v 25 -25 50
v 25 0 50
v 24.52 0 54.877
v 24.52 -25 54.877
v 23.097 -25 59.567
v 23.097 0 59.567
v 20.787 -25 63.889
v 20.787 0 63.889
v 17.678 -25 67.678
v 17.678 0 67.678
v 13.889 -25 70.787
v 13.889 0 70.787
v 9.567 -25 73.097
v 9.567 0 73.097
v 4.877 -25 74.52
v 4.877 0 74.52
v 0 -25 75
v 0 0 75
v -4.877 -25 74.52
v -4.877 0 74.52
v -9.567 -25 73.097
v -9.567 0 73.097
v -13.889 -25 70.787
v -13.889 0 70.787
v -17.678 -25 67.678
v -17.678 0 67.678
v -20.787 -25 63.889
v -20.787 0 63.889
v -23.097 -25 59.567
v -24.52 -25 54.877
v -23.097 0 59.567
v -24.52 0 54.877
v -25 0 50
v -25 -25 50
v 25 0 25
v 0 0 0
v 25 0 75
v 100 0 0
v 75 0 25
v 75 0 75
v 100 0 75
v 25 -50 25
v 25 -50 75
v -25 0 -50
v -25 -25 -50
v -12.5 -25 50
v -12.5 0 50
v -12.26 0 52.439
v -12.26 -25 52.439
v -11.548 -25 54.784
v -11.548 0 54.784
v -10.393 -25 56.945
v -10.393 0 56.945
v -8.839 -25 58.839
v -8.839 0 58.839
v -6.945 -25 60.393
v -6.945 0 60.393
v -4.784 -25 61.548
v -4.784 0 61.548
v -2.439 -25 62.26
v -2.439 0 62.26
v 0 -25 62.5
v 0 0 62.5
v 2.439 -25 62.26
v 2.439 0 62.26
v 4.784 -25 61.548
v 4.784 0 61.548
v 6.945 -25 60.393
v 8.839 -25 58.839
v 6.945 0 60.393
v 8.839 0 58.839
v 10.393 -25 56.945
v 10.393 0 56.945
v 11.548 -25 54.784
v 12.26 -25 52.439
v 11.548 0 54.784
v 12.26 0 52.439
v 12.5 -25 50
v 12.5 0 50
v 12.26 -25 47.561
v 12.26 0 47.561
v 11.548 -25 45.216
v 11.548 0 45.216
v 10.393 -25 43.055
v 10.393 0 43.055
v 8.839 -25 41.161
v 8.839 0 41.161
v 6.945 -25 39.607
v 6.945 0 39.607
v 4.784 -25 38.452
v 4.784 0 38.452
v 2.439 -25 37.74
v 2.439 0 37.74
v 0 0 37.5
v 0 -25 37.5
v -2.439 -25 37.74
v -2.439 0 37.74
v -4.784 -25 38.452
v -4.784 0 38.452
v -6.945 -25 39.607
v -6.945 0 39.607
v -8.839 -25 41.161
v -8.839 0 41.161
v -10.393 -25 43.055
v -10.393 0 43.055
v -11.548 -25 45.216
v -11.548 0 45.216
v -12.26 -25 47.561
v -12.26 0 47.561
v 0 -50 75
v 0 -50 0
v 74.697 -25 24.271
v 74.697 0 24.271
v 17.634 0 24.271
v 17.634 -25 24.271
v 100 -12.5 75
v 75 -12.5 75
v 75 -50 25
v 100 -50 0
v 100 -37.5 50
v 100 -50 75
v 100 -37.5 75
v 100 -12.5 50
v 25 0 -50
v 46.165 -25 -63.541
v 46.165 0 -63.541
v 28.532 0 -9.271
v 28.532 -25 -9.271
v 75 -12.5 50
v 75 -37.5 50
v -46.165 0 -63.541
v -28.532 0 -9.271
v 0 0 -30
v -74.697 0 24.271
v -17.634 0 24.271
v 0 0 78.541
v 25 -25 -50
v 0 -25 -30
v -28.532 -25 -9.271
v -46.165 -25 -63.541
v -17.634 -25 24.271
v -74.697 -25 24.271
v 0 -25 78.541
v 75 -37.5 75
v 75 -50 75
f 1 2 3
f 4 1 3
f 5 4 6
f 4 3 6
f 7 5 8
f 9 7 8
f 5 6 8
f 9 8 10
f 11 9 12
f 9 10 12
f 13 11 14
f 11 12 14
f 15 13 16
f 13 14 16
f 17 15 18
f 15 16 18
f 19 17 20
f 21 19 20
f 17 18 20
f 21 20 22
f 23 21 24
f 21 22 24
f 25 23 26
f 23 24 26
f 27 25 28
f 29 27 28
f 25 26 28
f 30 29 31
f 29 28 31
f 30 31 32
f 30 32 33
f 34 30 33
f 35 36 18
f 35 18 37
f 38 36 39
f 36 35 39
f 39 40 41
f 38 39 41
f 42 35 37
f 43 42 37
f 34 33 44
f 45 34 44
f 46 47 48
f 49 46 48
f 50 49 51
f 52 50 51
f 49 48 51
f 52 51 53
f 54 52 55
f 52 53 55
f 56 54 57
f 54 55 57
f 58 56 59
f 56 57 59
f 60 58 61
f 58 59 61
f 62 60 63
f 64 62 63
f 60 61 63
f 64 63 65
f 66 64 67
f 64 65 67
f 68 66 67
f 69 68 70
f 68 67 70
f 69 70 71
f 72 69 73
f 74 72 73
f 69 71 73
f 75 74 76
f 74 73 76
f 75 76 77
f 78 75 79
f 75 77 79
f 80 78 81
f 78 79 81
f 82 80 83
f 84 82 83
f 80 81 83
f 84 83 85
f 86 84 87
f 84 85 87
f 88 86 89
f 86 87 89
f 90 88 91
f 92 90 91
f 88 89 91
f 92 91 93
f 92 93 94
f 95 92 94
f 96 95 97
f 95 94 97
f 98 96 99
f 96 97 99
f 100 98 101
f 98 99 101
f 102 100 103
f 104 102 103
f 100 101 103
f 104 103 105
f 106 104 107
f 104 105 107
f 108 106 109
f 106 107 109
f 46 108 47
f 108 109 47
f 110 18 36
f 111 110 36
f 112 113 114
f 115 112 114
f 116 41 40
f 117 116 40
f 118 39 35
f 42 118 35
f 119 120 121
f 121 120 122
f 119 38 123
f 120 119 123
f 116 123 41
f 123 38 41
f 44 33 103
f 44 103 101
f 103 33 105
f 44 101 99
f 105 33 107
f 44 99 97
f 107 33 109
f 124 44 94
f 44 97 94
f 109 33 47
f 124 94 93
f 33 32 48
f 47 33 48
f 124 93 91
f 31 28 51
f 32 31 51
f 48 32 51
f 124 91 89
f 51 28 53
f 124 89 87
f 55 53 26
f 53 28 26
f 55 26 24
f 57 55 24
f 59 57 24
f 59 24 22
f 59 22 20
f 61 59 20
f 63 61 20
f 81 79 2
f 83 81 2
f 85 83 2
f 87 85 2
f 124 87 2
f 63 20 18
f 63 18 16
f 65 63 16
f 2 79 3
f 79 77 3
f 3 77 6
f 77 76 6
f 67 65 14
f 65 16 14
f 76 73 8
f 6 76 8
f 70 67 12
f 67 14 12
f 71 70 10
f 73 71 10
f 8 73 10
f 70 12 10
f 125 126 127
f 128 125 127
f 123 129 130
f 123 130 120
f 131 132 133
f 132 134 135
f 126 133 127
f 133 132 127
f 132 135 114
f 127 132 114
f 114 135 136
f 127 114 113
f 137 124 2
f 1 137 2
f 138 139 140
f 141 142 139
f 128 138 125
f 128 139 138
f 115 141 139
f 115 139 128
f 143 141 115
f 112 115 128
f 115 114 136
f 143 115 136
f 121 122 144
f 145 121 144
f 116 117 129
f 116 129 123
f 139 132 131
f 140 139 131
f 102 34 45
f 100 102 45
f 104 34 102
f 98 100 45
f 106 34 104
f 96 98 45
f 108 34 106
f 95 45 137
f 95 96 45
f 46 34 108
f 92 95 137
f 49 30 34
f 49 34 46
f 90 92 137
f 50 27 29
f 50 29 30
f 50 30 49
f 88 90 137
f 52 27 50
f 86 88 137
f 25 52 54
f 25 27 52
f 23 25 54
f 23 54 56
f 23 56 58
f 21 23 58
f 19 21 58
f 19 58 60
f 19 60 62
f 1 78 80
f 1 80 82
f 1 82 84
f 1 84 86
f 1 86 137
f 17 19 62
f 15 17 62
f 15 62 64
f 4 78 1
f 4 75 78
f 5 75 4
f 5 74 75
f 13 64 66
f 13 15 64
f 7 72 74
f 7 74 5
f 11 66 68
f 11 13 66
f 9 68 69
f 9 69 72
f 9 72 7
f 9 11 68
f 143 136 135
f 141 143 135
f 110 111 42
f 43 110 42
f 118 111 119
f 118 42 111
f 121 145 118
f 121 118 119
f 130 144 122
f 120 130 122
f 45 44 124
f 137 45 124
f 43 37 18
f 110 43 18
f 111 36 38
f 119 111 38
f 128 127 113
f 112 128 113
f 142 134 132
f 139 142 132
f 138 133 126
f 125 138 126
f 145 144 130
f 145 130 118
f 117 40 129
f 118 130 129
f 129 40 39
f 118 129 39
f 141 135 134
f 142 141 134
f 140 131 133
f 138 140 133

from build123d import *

# Parameters (mm, degrees)
F1_DEPTH = 25
F3_DEPTH = 25
F5_DEPTH = 50
F6_W     = 25
F6_H     = 25
F7_DEPTH = 25


with BuildPart() as f1:
    # F0 (on Front) → F1 (new body)
    with BuildSketch(Plane.XZ):
        with BuildLine():
            ThreePointArc((-28.531695, -9.27051), (-28.531695, 9.27051), (-17.633558, 24.27051))
            Line((-17.633558, 24.27051), (-74.696949, 24.27051))
            Line((-74.696949, 24.27051), (-28.531695, -9.27051))
        make_face()
        with BuildLine():
            ThreePointArc((17.633558, 24.27051), (0, 30), (-17.633558, 24.27051))
            ThreePointArc((-17.633558, 24.27051), (-28.531695, 9.27051), (-28.531695, -9.27051))
            ThreePointArc((-28.531695, -9.27051), (-17.633558, -24.27051), (0, -30))
            ThreePointArc((0, -30), (17.633558, -24.27051), (28.531695, -9.27051))
            ThreePointArc((28.531695, -9.27051), (29.63065, -4.693034), (30, 0))
            ThreePointArc((30, 0), (26.730196, 13.619715), (17.633558, 24.27051))
        make_face()
        with BuildLine():
            Line((17.633558, 24.27051), (0, 78.54102))
            Line((0, 78.54102), (-17.633558, 24.27051))
            ThreePointArc((-17.633558, 24.27051), (0, 30), (17.633558, 24.27051))
        make_face()
        with BuildLine():
            Line((74.696949, 24.27051), (17.633558, 24.27051))
            ThreePointArc((17.633558, 24.27051), (26.730196, 13.619715), (30, 0))
            ThreePointArc((30, 0), (29.63065, -4.693034), (28.531695, -9.27051))
            Line((28.531695, -9.27051), (74.696949, 24.27051))
        make_face()
        with BuildLine():
            ThreePointArc((28.531695, -9.27051), (17.633558, -24.27051), (0, -30))
            Line((0, -30), (46.165253, -63.54102))
            Line((46.165253, -63.54102), (28.531695, -9.27051))
        make_face()
        with BuildLine():
            ThreePointArc((0, -30), (-17.633558, -24.27051), (-28.531695, -9.27051))
            Line((-28.531695, -9.27051), (-46.165253, -63.54102))
            Line((-46.165253, -63.54102), (0, -30))
        make_face()
    extrude(amount=F1_DEPTH)


with BuildPart() as f3:
    # F2 (on Front) → F3 (new body)
    with BuildSketch(Plane.XZ):
        with BuildLine():
            Line((25, -50), (25, 50))
            ThreePointArc((25, 50), (0, 25), (-25, 50))
            Line((-25, 50), (-25, -50))
            Line((-25, -50), (25, -50))
        make_face()
        with BuildLine():
            ThreePointArc((-12.5, 50), (0, 62.5), (12.5, 50))
            Line((12.5, 50), (25, 50))
            ThreePointArc((25, 50), (0, 75), (-25, 50))
            Line((-25, 50), (-12.5, 50))
        make_face()
        with BuildLine():
            Line((25, 50), (12.5, 50))
            ThreePointArc((12.5, 50), (0, 37.5), (-12.5, 50))
            Line((-12.5, 50), (-25, 50))
            ThreePointArc((-25, 50), (0, 25), (25, 50))
        make_face()
    extrude(amount=F3_DEPTH)


with BuildPart() as f5:
    # F4 (on Front) → F5 (new body)
    with BuildSketch(Plane.XZ):
        Polygon((0, 75), (0, 0), (100, 0), (100, 75), (75, 75), (75, 25), (25, 25), (25, 75), align=None)
    extrude(amount=F5_DEPTH)

    # F6 (on face) → F7 (cut)
    with BuildSketch(Plane.XY.offset(75)):
        with Locations((87.5, -25)):
            Rectangle(F6_W, F6_H)
    extrude(amount=-F7_DEPTH, mode=Mode.SUBTRACT)


solid = Compound([f1.part, f3.part, f5.part])
